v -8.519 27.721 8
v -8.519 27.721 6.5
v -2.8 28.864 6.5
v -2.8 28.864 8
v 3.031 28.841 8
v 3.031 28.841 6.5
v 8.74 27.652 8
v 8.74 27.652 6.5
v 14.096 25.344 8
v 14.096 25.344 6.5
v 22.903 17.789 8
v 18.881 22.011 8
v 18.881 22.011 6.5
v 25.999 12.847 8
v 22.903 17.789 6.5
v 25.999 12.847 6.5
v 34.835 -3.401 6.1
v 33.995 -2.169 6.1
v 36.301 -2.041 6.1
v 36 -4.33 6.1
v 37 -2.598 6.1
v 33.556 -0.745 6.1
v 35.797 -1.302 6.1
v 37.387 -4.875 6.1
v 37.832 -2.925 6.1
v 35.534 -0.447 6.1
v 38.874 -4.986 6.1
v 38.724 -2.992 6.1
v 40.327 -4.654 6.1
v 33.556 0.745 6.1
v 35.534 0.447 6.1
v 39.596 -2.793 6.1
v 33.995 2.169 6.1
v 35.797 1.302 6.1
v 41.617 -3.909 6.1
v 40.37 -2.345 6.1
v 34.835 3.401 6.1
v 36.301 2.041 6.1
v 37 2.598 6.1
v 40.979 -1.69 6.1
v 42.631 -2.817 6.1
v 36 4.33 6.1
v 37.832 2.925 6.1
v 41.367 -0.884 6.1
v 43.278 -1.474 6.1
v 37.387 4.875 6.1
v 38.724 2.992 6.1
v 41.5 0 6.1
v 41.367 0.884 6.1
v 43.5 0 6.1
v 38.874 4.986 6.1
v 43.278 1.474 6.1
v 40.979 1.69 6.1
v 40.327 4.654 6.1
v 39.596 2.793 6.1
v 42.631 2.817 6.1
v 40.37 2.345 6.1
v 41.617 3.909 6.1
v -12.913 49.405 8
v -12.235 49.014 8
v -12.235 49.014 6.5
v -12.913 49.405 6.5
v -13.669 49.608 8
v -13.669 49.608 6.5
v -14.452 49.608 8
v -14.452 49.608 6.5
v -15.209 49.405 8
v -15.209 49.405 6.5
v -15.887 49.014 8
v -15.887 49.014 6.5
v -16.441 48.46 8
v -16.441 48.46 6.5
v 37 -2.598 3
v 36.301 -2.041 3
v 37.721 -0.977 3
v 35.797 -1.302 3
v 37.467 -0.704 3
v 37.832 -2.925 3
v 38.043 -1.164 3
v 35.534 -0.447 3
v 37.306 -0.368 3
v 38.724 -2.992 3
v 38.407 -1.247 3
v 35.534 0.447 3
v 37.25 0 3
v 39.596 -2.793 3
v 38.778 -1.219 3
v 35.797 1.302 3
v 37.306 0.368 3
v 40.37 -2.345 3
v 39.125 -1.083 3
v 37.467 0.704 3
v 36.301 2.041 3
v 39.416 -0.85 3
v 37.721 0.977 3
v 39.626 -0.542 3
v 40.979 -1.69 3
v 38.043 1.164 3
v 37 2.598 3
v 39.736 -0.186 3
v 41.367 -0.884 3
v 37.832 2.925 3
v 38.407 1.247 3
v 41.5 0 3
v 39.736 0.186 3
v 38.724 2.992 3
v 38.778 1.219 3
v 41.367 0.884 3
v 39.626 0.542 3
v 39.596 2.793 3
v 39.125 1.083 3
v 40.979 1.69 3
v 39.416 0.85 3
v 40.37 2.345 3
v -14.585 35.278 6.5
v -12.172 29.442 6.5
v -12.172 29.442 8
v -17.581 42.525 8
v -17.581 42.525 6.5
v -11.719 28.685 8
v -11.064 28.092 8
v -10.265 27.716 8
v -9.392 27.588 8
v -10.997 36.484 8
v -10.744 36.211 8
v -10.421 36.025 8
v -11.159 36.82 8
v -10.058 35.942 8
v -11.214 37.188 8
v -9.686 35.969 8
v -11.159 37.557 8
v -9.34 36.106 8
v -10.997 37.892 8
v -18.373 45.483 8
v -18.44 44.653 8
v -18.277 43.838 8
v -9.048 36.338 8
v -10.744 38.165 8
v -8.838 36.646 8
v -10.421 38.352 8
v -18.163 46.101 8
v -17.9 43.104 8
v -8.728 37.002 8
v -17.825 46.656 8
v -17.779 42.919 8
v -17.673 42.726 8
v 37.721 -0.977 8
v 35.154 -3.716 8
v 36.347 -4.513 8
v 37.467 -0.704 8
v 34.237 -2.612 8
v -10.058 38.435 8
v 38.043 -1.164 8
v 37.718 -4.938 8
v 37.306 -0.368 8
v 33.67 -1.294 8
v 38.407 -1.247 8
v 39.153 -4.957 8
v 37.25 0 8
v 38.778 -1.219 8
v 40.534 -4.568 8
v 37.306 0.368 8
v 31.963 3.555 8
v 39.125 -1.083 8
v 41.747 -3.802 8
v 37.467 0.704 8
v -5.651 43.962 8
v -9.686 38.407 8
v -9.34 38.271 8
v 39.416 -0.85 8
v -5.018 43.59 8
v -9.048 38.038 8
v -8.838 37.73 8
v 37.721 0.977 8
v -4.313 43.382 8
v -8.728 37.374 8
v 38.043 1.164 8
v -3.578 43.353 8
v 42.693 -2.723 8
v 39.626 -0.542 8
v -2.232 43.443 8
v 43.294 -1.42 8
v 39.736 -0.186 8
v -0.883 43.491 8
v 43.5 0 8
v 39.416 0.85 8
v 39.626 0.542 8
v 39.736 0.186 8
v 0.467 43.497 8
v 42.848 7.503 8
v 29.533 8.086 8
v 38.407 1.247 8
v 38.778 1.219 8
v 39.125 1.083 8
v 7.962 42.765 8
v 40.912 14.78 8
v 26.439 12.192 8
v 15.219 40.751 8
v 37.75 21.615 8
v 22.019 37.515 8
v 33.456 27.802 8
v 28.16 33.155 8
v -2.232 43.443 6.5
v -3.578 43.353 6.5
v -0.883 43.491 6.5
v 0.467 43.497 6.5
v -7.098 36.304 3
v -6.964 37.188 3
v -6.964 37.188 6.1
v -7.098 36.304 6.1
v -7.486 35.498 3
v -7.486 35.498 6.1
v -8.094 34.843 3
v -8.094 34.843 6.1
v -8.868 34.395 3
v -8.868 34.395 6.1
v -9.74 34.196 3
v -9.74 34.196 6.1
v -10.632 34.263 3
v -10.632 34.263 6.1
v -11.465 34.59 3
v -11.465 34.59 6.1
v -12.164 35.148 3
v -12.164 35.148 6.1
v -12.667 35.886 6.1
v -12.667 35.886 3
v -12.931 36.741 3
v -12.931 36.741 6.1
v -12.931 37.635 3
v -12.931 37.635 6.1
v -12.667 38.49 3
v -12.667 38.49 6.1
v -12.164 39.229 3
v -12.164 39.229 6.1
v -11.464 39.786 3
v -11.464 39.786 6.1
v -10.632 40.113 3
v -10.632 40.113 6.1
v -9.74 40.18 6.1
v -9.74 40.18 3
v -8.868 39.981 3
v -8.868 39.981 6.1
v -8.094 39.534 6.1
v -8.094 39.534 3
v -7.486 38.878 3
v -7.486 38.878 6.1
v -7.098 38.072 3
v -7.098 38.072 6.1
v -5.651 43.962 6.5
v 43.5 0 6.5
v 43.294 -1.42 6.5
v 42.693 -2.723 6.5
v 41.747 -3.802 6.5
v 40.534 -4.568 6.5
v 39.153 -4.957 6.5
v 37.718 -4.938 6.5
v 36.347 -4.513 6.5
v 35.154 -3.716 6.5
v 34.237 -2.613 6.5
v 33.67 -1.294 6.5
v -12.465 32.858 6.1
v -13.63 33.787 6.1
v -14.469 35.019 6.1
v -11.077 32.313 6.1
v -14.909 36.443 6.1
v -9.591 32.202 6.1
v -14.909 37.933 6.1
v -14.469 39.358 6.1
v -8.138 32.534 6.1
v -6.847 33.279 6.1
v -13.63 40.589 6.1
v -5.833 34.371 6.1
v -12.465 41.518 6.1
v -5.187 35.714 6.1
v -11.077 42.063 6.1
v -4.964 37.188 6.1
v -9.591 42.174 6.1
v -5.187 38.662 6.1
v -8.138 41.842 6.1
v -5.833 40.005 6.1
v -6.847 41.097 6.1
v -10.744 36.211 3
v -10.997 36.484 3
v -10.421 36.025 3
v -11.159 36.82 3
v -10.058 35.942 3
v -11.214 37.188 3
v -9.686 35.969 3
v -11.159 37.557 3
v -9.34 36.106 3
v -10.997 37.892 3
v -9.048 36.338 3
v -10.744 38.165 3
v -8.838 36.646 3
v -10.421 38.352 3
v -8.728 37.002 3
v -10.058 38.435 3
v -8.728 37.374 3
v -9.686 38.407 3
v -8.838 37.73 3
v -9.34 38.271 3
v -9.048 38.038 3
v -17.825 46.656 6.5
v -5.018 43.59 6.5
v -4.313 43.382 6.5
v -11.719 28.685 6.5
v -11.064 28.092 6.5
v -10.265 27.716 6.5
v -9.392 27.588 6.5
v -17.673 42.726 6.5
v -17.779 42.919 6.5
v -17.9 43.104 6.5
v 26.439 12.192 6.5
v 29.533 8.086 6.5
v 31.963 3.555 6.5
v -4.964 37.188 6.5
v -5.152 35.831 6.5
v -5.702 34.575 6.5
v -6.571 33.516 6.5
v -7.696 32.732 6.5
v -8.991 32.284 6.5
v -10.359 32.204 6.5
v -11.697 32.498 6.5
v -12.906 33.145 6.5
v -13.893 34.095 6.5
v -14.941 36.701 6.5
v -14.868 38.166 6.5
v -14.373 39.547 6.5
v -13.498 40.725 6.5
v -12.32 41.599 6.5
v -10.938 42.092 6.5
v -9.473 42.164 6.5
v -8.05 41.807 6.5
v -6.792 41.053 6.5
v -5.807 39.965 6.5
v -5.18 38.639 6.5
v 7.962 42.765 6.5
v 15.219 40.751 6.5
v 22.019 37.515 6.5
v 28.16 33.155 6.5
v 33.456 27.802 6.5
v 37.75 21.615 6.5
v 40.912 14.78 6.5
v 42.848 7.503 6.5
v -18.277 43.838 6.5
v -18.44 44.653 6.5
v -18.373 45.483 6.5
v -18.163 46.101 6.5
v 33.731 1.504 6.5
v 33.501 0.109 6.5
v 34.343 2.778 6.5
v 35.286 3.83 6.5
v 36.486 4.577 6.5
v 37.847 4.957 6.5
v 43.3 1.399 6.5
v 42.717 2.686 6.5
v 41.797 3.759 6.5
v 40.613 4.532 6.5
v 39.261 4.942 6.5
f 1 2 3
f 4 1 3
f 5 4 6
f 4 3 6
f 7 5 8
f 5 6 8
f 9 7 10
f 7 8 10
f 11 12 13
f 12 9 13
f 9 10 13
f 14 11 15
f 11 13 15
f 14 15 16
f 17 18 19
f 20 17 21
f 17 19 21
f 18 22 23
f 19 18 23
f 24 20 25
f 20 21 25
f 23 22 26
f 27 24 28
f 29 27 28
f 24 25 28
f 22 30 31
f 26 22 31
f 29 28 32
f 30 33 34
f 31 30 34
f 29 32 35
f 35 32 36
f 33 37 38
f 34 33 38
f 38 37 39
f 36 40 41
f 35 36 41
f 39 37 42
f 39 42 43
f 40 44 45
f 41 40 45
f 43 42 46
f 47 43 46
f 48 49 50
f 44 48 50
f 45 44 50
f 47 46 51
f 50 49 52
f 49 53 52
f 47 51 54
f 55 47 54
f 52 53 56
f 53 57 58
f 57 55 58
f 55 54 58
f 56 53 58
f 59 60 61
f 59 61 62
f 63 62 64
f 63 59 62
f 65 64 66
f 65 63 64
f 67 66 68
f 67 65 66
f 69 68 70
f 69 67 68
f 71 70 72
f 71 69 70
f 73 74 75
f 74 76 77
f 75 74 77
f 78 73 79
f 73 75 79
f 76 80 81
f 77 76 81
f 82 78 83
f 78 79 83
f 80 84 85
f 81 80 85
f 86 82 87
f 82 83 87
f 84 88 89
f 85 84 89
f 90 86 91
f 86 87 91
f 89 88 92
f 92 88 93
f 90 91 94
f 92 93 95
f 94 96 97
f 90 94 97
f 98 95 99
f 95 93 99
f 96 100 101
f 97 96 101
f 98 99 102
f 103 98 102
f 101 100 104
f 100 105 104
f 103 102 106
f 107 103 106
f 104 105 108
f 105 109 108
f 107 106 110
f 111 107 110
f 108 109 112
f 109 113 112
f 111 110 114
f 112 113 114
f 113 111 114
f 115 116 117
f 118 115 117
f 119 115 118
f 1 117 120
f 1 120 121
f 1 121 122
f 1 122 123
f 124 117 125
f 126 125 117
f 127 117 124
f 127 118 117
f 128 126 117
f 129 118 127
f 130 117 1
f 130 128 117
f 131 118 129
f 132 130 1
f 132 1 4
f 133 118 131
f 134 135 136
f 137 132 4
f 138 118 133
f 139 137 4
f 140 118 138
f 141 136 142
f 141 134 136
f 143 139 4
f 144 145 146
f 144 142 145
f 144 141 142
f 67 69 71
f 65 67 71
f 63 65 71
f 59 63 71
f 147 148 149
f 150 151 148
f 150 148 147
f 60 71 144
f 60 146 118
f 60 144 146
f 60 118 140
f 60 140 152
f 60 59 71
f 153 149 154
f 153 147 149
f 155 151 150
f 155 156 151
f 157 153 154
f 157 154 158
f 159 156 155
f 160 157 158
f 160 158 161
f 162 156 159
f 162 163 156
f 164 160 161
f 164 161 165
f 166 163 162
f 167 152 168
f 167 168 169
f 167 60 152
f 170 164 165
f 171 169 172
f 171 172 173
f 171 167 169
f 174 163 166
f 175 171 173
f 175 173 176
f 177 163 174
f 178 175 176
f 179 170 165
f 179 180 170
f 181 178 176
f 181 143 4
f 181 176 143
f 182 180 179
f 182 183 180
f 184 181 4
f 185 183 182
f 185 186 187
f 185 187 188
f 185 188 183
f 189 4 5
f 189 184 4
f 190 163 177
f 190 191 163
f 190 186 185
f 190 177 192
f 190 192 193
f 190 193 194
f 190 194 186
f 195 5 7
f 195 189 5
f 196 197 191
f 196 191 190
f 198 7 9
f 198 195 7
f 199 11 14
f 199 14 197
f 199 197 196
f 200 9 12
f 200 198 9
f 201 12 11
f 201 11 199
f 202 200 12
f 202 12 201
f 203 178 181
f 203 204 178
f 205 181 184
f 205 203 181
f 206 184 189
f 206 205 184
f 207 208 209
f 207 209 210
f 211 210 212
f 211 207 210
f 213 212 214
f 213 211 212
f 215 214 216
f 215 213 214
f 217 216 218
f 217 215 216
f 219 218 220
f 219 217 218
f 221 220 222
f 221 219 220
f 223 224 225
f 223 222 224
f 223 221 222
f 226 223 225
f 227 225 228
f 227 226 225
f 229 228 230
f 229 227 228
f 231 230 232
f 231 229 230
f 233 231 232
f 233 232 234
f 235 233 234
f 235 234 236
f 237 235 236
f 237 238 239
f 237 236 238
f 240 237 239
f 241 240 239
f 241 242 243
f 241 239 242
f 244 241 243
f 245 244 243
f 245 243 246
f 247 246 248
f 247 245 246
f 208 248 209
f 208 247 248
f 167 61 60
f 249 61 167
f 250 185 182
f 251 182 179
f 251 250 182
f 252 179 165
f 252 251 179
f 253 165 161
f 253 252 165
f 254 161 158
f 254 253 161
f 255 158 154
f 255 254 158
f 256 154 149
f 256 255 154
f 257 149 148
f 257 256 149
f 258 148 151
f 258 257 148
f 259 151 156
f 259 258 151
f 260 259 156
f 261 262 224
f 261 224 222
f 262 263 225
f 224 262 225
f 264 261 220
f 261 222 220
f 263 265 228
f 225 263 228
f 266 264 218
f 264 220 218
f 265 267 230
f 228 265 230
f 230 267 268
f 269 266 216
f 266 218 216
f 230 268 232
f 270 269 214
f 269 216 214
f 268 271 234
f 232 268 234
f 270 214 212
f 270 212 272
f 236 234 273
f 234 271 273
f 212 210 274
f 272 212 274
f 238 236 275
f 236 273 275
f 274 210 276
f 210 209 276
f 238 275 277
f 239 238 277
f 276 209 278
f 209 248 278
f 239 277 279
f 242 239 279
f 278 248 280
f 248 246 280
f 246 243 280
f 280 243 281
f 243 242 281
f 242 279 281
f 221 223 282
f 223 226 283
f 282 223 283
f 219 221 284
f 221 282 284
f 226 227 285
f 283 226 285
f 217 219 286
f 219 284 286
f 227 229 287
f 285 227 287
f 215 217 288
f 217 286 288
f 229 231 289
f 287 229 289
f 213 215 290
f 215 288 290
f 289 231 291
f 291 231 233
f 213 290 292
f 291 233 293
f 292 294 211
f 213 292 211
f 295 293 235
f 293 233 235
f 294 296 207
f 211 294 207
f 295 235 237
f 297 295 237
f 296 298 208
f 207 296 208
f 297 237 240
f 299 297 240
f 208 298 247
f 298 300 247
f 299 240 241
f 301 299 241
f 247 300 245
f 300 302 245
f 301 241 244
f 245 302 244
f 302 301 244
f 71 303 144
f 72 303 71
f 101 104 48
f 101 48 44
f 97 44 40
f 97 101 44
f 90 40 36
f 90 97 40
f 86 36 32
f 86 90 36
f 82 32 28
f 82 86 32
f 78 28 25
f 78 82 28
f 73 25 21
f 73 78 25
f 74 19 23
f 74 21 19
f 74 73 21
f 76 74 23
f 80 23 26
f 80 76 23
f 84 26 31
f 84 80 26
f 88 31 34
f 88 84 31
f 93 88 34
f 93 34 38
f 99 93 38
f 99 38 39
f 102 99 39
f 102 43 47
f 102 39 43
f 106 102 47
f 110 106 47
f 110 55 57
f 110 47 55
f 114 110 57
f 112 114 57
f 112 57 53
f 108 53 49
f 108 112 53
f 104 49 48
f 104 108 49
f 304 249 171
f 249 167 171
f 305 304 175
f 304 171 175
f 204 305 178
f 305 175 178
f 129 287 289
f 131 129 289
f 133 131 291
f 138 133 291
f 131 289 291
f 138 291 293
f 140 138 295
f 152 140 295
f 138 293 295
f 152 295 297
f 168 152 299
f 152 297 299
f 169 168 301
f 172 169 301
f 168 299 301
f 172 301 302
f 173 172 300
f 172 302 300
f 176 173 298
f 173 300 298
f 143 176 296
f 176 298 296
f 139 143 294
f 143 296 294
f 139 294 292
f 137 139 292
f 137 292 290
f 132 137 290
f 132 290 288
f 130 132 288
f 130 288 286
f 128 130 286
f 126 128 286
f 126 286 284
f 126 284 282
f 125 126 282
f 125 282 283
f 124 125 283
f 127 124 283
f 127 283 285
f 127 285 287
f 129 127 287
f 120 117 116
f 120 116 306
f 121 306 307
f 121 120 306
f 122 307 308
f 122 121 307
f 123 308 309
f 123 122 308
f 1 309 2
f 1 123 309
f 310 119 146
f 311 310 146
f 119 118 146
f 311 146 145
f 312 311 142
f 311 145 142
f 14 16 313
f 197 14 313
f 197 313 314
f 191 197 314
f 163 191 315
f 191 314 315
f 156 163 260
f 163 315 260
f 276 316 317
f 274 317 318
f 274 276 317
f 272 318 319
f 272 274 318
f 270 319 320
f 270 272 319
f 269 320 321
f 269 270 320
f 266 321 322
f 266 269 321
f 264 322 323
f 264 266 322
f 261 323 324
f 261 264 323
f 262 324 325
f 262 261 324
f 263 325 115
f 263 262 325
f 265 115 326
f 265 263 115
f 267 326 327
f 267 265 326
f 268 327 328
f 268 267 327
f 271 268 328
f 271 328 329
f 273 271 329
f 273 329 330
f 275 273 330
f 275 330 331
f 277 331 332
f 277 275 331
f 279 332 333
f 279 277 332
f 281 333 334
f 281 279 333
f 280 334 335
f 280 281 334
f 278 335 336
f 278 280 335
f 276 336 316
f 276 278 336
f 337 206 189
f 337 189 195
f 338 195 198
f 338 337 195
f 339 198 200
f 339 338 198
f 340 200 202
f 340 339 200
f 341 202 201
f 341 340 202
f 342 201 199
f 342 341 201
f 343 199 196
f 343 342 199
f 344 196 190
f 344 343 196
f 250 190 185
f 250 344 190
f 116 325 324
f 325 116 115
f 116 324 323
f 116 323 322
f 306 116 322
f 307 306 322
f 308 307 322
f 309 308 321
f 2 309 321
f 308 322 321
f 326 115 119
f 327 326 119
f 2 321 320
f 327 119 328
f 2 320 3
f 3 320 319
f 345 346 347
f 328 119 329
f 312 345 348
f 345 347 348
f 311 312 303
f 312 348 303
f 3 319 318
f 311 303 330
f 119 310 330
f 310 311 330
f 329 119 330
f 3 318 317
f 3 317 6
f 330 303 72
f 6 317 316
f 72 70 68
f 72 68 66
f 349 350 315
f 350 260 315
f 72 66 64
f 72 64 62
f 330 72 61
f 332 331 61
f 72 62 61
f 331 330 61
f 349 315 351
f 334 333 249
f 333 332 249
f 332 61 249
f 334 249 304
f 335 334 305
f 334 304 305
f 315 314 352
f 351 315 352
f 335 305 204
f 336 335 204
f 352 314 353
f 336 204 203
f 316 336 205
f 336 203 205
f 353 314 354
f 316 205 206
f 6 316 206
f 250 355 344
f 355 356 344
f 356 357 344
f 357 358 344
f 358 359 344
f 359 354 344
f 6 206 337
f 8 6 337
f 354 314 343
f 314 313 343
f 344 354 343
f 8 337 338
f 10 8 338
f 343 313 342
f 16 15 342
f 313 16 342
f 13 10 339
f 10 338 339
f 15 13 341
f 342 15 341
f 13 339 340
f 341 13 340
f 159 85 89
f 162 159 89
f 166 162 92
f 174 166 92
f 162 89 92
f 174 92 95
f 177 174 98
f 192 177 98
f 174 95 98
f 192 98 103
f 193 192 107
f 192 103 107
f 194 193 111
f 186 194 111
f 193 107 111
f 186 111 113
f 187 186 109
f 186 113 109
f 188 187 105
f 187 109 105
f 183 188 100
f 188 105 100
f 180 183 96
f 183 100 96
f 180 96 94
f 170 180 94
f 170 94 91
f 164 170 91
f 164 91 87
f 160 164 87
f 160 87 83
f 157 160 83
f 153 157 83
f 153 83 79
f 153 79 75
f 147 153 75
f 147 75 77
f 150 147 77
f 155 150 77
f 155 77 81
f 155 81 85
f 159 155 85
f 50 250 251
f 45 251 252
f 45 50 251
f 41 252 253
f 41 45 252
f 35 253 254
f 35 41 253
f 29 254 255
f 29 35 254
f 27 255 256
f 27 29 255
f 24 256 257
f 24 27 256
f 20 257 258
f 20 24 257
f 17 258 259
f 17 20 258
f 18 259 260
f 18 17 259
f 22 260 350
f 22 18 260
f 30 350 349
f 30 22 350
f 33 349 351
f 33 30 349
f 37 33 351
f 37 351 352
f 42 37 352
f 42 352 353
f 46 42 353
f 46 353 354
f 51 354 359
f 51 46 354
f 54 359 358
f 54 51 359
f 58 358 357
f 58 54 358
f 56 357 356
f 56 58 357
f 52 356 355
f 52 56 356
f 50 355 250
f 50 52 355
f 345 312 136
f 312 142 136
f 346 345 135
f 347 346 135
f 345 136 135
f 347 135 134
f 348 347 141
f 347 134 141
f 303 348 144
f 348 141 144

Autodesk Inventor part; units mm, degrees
ref_plane "YZ Plane" through (0, 0, 0) normal (1, 0, 0) x (0, 1, 0)
ref_plane "XZ Plane" through (0, 0, 0) normal (0, 1, 0) x (-1, 0, 0)
ref_plane "XY Plane" through (0, 0, 0) normal (0, 0, 1) x (1, 0, 0)
sketch "スケッチ1" plane through (0, 0, 0) normal (0, 0, 1) x (1, 0, 0)
  circle A0 centre (0, 0) radius 33.5 construction
  circle A1 centre (0, 0) radius 43.5
  dimension "d0" = 67
  dimension "d1" = 87
extrude "押し出し1" add sketch "スケッチ1" along normal blind 1
sketch "スケッチ2" plane through (0, 0, 1) normal (0, 0, 1) x (1, 0, 0)
  circle A0 centre (0, 0) radius 33.5
  circle A1 centre (0, 0) radius 43.5 projected
  dimension "d4" = 67
extrude "押し出し2" add sketch "スケッチ2" along normal blind 2
sketch "スケッチ4" plane through (0, 0, 3) normal (0, 0, 1) x (1, 0, 0)
  circle A0 centre (0, 0) radius 33.5 construction
  circle A1 centre (0, 0) radius 43.5 construction
  line L0 (0, 0) -> (33.5, 0) construction
  line L1 (33.5, 0) -> (43.5, 0) construction
  circle A2 centre (0, 0) radius 33.5 construction
  line L2 (0, 0) -> (-33.5, 0) construction
  circle A3 centre (0, 0) radius 43.5 construction
  line L3 (-43.5, 0) -> (-33.5, 0) construction
  circle A4 centre (38.5, 0) radius 3.05
  circle A5 centre (-38.5, 0) radius 3.05
  circle A6 centre (0, 0) radius 38.5 construction
  circle A7 centre (-9.9645, 37.1881) radius 3.05 construction
  arc A8 (-3.4944, 44.3648) -> (-9.9645, 37.1881) centre (38.5, 0) ccw construction
  line L4 (38.5, 0) -> (-9.9645, 37.1881) construction
  line L5 (-9.9645, 37.1881) -> (-12.3843, 39.0449) construction
  arc A9 (0.0788, 43.4999) -> (-7.5448, 35.3314) centre (38.5, 0) ccw
  arc A10 (-9.6001, 42.4274) -> (-12.3843, 39.0449) centre (38.5, 0) ccw
  arc A11 (-12.3843, 39.0449) -> (-7.5448, 35.3314) centre (-9.9645, 37.1881) ccw
  arc A12 (0.0788, 43.4999) -> (-9.6001, 42.4274) centre (0, 0) ccw
  circle A13 centre (9.9645, -37.1881) radius 3.05 construction
  line L6 (-38.5, 0) -> (9.9645, -37.1881) construction
  line L7 (9.9645, -37.1881) -> (12.3843, -39.0449) construction
  arc A14 (-0.0788, -43.4999) -> (7.5448, -35.3314) centre (-38.5, 0) ccw
  arc A15 (9.6001, -42.4274) -> (12.3843, -39.0449) centre (-38.5, 0) ccw
  arc A16 (12.3843, -39.0449) -> (7.5448, -35.3314) centre (9.9645, -37.1881) ccw
  arc A17 (-0.0788, -43.4999) -> (9.6001, -42.4274) centre (0, 0) ccw
  line L8 (-9.9645, 37.1881) -> (9.9645, -37.1881) construction
  dimension "d7" = 6.1
  dimension "d8" = 3.05
  dimension "d15" = 105
extrude "押し出し3" cut sketch "スケッチ4" against normal through all
fillet "フィレット1" radius 1 4 edges at (-9.6001, 42.4274, 1.5) (0.0788, 43.4999, 1.5) (-0.0788, -43.4999, 1.5) (9.6001, -42.4274, 1.5)
sketch "スケッチ6" plane through (0, 0, 3) normal (0, 0, 1) x (1, 0, 0)
  arc A0 (-12.3843, 39.0449) -> (-7.5448, 35.3314) centre (-9.9645, 37.1881) ccw construction
  circle A1 centre (38.5, 0) radius 3.05 construction
  circle A2 centre (-9.9645, 37.1881) radius 3
  circle A3 centre (38.5, 0) radius 3
  point P0 (0, 0)
  dimension "d16" = 6
extrude "押し出し5" add sketch "スケッチ6" along normal blind 3.1
sketch "スケッチ7" plane through (-9.9645, 37.1881, 6.1) normal (0, 0, 1) x (1, 0, 0)
  circle A0 centre (0, 0) radius 3 construction
  circle A1 centre (48.4645, -37.1881) radius 3 construction
  circle A2 centre (0, 0) radius 5
  circle A3 centre (48.4645, -37.1881) radius 3 projected
  circle A4 centre (48.4645, -37.1881) radius 5
  point P0 (9.9645, -37.1881)
  dimension "d19" = 10
extrude "押し出し6" add sketch "スケッチ7" along normal blind 0.4 contours A2 | A3 | A4
sketch "スケッチ8" plane through (-9.9645, 37.1881, 6.5) normal (0, 0, 1) x (1, 0, 0)
  circle A0 centre (9.9645, -37.1881) radius 33.5 construction
  circle A1 centre (9.9645, -37.1881) radius 29 construction
  circle A2 centre (48.4645, -37.1881) radius 5 construction
  arc A3 (43.6349, -38.4822) -> (36.1372, -24.6985) centre (11.2764, -47.1527) ccw construction
  line L0 (9.9645, -37.1881) -> (48.4645, -37.1881) construction
  line L1 (48.4645, -37.1881) -> (11.2764, -47.1527) construction
  circle A4 centre (0, 0) radius 5 construction
  circle A5 centre (48.4645, -37.1881) radius 3.05 construction
  line L2 (48.4645, -37.1881) -> (-9.5202, 7.3051) construction
  line L3 (9.9645, -37.1881) -> (-4.6207, -1.9104) construction
  circle A6 centre (0, 0) radius 5 construction
  line L4 (-1.1156, -10.3883) -> (-7.9245, 6.0806)
  arc A7 (36.1372, -24.6985) -> (-1.1156, -10.3883) centre (9.9645, -37.1881) ccw
  arc A8 (43.6349, -38.4822) -> (36.1372, -24.6985) centre (11.2764, -47.1527) ccw
  arc A9 (22.6521, -78.7967) -> (10.4317, 6.3093) centre (9.9645, -37.1881) ccw projected
  arc A10 (43.6349, -38.4822) -> (53.4645, -37.1881) centre (48.4645, -37.1881) ccw
  arc A11 (53.4645, -37.1881) -> (5.2496, 6.0556) centre (9.9645, -37.1881) ccw
  line L5 (-7.9245, 6.0806) -> (-9.5202, 7.3051)
  line L6 (-9.5202, 7.3051) -> (-4.6501, 13.652)
  line L7 (-4.6501, 13.652) -> (5.2496, 6.0556)
  point P0 (10.4317, 6.3093)
  dimension "d22" = 58
  dimension "d23" = 15
  dimension "d24" = 12
  dimension "d25" = 8
extrude "押し出し7" add sketch "スケッチ8" along normal blind 1.5
sketch "スケッチ9" plane through (0, 0, 3) normal (0, 0, 1) x (1, 0, 0)
  circle A0 centre (0, 0) radius 61.8319
extrude "押し出し8" cut sketch "スケッチ9" against normal through all
sketch "スケッチ10" plane through (-9.9645, 37.1881, 3) normal (0, 0, -1) x (-1, 0, 0)
  circle A0 centre (-48.4645, -37.1881) radius 3 construction
  circle A1 centre (0, 0) radius 3 construction
  circle A2 centre (-48.4645, -37.1881) radius 1.25
  circle A3 centre (0, 0) radius 1.25
  point P0 (-9.9645, -37.1881)
  dimension "d30" = 2.5
extrude "押し出し9" cut sketch "スケッチ10" against normal through all
fillet "フィレット2" radius 3 6 edges at (-19.4848, 44.4933, 7.25) (-14.6147, 50.8401, 7.25) (-17.889, 43.2688, 7.25) (-4.7149, 43.2437, 7.25) (-11.0801, 26.7998, 7.25) (26.1727, 12.4896, 7.25)
properties part number "kanure_02"
